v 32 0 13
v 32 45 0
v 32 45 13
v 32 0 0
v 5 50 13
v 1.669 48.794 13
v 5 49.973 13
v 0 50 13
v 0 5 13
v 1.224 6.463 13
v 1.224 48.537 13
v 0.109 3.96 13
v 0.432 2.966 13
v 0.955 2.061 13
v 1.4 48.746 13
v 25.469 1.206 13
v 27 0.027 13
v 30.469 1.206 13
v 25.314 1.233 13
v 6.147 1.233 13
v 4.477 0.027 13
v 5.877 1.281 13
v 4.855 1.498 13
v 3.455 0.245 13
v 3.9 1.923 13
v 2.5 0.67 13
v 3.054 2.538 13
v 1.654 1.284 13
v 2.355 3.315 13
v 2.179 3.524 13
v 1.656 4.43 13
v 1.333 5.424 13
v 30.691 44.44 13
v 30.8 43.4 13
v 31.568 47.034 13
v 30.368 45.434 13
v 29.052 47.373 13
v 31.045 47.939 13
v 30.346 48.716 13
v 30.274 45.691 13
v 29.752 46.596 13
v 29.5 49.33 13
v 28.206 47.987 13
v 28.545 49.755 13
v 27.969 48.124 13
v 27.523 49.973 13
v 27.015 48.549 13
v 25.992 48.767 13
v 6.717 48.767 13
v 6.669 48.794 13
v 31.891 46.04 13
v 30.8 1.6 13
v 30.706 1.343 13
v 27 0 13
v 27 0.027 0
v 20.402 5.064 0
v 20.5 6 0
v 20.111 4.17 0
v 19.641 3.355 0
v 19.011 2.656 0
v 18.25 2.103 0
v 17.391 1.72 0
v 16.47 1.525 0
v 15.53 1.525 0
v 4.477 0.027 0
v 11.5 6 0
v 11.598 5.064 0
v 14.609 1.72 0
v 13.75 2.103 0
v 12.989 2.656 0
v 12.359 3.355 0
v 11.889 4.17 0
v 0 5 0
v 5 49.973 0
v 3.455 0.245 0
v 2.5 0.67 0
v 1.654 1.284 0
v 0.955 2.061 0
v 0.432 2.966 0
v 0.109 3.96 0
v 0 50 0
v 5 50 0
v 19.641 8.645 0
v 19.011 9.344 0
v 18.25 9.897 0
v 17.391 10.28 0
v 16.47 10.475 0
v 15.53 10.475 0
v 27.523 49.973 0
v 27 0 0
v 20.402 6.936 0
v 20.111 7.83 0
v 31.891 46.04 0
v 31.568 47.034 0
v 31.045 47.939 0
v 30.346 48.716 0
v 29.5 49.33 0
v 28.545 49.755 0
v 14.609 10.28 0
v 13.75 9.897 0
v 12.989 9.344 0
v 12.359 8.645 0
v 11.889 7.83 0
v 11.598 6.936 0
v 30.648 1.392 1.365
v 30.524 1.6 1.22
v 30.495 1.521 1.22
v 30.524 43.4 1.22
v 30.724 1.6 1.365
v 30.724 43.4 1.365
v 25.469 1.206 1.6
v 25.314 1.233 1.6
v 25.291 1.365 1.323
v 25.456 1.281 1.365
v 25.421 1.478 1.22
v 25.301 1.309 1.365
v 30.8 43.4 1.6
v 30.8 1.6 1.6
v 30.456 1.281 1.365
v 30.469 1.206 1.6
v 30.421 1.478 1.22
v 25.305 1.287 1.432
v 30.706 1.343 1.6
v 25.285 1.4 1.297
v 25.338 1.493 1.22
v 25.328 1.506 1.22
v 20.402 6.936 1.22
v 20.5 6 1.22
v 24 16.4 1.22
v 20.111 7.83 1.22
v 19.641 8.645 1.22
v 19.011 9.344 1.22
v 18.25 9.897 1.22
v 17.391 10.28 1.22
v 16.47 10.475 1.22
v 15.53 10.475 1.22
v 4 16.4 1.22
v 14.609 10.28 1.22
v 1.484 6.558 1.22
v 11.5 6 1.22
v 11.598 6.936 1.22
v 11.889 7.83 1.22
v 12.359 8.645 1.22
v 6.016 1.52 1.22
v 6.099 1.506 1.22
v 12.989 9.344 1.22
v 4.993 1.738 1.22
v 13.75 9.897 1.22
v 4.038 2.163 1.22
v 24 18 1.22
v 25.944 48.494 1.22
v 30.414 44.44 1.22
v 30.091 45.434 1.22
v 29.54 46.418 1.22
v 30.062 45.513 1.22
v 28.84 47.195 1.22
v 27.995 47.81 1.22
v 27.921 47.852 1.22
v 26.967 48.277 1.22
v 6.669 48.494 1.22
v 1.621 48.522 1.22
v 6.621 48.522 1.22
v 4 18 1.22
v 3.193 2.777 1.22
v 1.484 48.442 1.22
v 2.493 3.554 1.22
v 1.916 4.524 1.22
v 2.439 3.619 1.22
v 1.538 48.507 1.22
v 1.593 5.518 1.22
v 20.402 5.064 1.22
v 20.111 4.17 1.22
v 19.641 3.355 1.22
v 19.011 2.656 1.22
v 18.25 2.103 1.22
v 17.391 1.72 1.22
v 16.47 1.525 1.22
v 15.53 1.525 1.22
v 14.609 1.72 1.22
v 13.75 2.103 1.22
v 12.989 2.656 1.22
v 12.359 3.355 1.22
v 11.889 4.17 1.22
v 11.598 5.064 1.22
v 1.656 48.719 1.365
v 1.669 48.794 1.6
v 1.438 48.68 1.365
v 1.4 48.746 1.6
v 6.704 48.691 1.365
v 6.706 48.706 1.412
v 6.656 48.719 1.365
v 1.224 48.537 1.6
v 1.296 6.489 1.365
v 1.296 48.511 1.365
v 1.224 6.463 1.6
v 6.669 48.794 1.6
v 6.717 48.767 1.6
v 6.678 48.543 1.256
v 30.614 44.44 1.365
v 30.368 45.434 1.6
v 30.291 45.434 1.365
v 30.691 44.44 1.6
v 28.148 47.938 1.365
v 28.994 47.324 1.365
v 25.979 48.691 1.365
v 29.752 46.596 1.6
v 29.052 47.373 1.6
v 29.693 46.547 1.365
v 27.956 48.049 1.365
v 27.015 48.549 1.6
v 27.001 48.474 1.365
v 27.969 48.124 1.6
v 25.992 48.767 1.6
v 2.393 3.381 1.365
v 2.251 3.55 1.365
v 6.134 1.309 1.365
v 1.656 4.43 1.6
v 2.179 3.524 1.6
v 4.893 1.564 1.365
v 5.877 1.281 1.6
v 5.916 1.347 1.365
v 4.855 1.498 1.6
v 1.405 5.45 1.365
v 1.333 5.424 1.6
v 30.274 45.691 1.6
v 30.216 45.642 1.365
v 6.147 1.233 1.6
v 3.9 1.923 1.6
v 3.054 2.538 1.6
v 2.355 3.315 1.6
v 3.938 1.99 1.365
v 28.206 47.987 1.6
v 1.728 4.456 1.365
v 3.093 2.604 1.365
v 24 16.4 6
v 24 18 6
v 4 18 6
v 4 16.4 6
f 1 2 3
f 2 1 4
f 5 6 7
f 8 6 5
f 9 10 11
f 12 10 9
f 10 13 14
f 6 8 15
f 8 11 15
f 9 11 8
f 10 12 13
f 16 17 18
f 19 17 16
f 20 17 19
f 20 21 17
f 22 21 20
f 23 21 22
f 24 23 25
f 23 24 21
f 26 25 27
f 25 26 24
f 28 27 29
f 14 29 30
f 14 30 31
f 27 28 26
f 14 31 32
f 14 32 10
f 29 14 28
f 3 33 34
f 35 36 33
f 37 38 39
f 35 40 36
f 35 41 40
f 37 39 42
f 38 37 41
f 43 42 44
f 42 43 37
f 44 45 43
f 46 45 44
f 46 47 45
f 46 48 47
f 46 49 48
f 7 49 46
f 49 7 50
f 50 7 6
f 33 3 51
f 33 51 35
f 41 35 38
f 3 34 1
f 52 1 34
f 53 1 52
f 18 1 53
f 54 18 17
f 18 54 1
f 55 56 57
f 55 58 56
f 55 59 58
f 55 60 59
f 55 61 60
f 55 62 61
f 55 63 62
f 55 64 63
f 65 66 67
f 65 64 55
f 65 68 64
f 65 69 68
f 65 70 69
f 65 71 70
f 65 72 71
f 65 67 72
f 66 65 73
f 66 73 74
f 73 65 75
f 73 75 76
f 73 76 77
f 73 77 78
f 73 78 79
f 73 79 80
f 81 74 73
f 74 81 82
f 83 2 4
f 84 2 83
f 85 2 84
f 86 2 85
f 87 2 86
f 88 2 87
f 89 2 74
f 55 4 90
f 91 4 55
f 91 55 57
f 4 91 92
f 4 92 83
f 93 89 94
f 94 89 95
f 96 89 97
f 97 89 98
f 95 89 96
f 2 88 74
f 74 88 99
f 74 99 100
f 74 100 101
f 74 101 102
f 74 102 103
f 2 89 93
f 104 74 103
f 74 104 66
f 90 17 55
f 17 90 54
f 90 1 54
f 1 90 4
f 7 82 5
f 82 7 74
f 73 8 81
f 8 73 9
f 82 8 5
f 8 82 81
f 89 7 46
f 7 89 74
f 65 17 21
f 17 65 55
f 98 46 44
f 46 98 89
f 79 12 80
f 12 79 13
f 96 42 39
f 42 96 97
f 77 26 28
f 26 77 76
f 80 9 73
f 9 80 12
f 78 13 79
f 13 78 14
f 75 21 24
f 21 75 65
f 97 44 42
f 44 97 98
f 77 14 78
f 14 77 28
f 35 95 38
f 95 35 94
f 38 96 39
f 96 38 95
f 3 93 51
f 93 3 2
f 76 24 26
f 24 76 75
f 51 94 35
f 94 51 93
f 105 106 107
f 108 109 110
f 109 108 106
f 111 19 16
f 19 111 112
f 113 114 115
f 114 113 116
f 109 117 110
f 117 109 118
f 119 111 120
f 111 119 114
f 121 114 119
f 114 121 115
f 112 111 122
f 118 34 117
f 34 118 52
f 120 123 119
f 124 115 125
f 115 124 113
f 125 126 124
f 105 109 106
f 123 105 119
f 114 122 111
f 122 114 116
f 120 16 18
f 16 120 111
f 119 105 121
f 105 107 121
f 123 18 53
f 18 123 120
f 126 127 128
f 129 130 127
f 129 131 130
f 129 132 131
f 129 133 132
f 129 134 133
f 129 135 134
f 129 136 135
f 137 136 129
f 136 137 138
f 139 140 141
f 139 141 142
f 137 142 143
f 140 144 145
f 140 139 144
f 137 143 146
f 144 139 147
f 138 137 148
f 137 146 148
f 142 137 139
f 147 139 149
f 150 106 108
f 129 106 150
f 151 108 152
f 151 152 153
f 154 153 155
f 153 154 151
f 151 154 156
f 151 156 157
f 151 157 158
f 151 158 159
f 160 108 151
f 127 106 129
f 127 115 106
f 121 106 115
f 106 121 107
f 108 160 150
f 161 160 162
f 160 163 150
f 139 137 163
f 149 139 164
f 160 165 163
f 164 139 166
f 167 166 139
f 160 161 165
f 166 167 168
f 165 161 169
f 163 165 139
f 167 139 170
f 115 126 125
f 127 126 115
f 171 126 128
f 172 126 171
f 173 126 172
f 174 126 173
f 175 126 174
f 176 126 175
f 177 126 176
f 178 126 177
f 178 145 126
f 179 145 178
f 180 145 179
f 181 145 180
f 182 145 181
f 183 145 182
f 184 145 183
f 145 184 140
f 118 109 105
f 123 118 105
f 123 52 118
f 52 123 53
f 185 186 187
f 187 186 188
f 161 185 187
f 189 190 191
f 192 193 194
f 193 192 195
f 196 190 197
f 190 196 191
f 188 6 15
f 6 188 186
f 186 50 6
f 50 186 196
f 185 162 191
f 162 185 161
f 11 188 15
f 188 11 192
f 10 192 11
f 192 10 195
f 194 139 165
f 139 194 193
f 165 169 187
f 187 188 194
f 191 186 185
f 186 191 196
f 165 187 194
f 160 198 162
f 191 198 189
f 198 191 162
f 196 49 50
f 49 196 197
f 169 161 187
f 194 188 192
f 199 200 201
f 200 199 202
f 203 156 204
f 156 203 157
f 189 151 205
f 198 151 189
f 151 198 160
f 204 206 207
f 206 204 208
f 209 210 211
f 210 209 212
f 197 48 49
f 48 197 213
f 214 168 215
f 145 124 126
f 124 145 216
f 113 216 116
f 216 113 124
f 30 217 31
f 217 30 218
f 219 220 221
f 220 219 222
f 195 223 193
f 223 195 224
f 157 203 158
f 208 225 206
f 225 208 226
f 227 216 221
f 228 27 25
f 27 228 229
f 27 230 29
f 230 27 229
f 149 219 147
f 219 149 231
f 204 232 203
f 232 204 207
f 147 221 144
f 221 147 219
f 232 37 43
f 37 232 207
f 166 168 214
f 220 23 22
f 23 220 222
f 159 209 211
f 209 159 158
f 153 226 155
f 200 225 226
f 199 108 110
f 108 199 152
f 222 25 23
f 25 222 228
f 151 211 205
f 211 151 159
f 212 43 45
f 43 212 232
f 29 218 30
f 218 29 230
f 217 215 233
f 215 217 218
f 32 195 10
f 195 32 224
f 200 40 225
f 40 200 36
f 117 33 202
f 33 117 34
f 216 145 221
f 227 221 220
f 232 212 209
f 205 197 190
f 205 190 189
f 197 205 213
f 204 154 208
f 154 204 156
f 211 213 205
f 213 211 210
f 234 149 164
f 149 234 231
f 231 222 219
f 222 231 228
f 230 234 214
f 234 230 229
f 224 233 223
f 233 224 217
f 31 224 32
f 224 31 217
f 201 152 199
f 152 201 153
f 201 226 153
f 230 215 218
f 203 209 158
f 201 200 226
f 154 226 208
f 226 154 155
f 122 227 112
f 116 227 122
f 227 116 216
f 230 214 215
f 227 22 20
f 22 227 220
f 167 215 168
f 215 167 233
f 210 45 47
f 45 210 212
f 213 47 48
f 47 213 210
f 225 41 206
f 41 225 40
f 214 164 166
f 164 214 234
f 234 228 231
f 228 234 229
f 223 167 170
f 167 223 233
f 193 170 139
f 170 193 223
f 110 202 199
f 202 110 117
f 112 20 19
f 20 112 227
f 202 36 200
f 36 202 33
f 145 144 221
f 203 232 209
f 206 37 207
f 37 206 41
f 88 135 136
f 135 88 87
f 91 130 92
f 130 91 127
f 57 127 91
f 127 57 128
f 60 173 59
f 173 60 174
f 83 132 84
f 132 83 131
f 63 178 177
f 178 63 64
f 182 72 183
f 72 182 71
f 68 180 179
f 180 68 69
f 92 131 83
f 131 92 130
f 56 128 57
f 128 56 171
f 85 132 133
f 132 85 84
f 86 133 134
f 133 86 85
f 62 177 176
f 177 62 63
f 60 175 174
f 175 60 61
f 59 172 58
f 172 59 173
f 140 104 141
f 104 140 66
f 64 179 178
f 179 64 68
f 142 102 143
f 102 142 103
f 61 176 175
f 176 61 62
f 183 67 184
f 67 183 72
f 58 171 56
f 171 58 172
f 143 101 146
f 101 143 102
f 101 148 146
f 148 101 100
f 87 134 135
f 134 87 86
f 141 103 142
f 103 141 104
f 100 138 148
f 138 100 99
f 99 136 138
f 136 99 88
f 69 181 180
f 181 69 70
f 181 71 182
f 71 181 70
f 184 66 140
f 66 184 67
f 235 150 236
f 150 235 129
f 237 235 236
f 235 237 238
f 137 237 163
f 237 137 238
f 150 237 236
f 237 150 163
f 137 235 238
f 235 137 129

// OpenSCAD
// Fully parametric box for 3D printing
// v4b
// http://www.thingiverse.com/thing:1918169
//
// Original box based on:
// http://tinyurl.com/oznh2p4
//
// Ventilation holes based on:
// http://www.thingiverse.com/thing:1826360

// Configure below
//
/* [Box parameters] */
// Length of box in mm
length = 50;   //[10:254]
// Width of box in mm
width = 32;    //[10:254]
// Height of box in mm
tall = 13;      //[10:254]
// Wall thickness of box in mm
thick = 1.6;      //[1:15]
// Depth of lip on lid in mm
lDepth = 2;     //[1:15]
// Corner radius; 0 = four square corners
cRadius = 5;   //[0:25]   
// Fancy: Square two opposing corners; 0=no, 1=yes (must be using cRadius)
sqCorners = 1;  //[0,1]

/* [Vent Parameters] */
// Vent hole size in mm; 0 = no vents
hSize = 0;      //[0:15]
// Hole Spacing in mm; must be > 0
hSpace = 1;     //[1:15]
// Vent hole type; 0=round, 1=square
hType = 0;      //[0,1]
//
// Configure above

/* [Hidden] */
//fn=200;            // 40 fragments per cicle; comment for draft mode
//$fn=60;
$fs=0.3;
fuz=0.1; fuzz=2*fuz;

// Draw Box
module post() {
/*     difference() {
	  cylinder(d=6, h=6);
	  cylinder(d=2, h=6.5);
     }
*/
     cylinder(d=5,h=1.2);
     cylinder(d=2.4, h=3);
}

module box() {
    translate([cRadius, cRadius, 0]){
	// Create a hollow box
	difference() {
	    // Create box shape
	    roundedBox(length,width,tall,cRadius,sqCorners);
	    // Create negative box shape, smaller by wall thickness plus clearance
	    translate([thick,thick,thick]) { 
		minkowski() { roundedBox(length-(thick*2),width-(thick*2),tall,cRadius,sqCorners);
		    sphere(r=0.4);
		}
		
		// Add vent holes to long sides
		gutterSpace=max(floor(tall*.2),thick*2,cRadius+hSize);
		if (hSize>0) addVentHoles(
		    length,     				// Panel Width
		    tall,						// Panel Height
		    gutterSpace,                // Gutter Width
		    gutterSpace,                // Gutter Height
		    hSize,						// Hole Radius
		    hSpace,					    // Hole Spacing
		    width+0.02,					// Hole Length
		    -(cRadius)-(thick+0.01),	// X Location
		    -gutterSpace,	            // Y Location
		    hType						// Hole Type
		    );
	    }
	    // cut openings in box	
	    //translate([(width-12)/2-cRadius,-cRadius-0.1,thick+2]) cube([12,10,6]);
	    translate([width/2-cRadius,6-cRadius,-fuz]) cylinder(d=10-1,h=5);
	    
	}
    }
    // Add mounting posts inside box
    //translate([(width-9)/2, 10, thick]) post();
    //translate([(width+9)/2, 10, thick]) post();
    translate([4, length-32-thick, 0]) cube([width-12,thick,6]);
}
box();

module lid() {
// Draw Box Lid
// Shift along-side first box
    translate([(width*2)+(10-cRadius), cRadius, 0]) {
	mirror([1,0,0]) {
	    difference() {
		union() {
		    // Create lid
		    roundedBox(length,width,thick,cRadius,sqCorners);
		    // Create lip on top of lid
		    difference() {
			// Create lip shape
			translate([thick,thick,thick]) {
			    roundedBox(length-(thick*2),width-(thick*2),lDepth,cRadius,sqCorners);}
                        // Create negative shape, smaller by wall thickness
                        // (add 0.01 to depth to bypass rendering bug)
                        translate([(thick*2),(thick*2),thick+0.01]) {
                            roundedBox(length-(thick*4),width-(thick*4),lDepth,cRadius,sqCorners);}    
		    }
		}

		// Cut holes in lid
		//translate([width/2-cRadius,length/2-cRadius,thick/2]) cube([15,24,4*thick],center=true);
        	    translate([width/2-cRadius-7,9-cRadius,-fuz]) cylinder(d=4,h=5);

            }
	}
    }
}

//lid();

// Render box according to parameters
module roundedBox(length, width, tall, radius, sqCorners)
{
	if (radius==0) {
		// Draw regular cube
		cube(size=[width,length,tall]);
	} else {
		// Draw rounded corner cube
		diam=2*radius;

		// Draw base rounded shape
		minkowski() {
			cube(size=[width-diam,length-diam, tall/2]);
			cylinder(r=radius, h=tall/2);
		}

        // Square opposing corners
		if (sqCorners==1) {
			// Corner cube bottom right
			translate([width-diam,-radius,0]) {cube(size=[radius,radius,tall]);}

			// Corner cube top left
			translate([-radius,length-diam,0]) {cube(size=[radius,radius,tall]);}  
		}
	}
}

// Ventillate opposing panels Y-axis panels
module addVentHoles (pWidth, pHeight, gWidth, gHeight, hSize, hSpace, hLength, xLoc, yLoc, hType) {
	hSpacing = hSpace + hSize;
    mainRowHoles = floor((pWidth - (2 * gWidth)) / hSpacing);
    rows = floor((pHeight - (2 * gHeight)) / hSpacing);

    for (n = [0:rows]) {
        for (i = [0:mainRowHoles]) {
            // If we're on an even-number row, then we put holes across the panel
            if (n % 2 == 0)
                translate([
					xLoc,
					yLoc+(i*hSpacing)+(gWidth),
					(n*hSpacing)+gHeight])
					
					rotate([0,90,0])
                    // Choose square or round hole
					if (hType==0) {
						cylinder(h=hLength, r=hSize/2);
					} else {
						translate([0,0,hLength/2]) cube(size=[hSize,hSize,hLength], center=true);
					}	

            // If we're on an odd-number row then we offset the holes, and drop one
            if ((n % 2 == 1) && (i<mainRowHoles)) // This drops the hole
				translate([
					xLoc,
					yLoc+(i*hSpacing)+(gWidth)+(hSpacing/2),
					(n*hSpacing)+gHeight]) 
					
					rotate([0,90,0])
					// Choose square or round hole
					if (hType==0) {				 
						cylinder(h=hLength, r=hSize/2);
					} else {
						translate([0,0,hLength/2]) cube(size=[hSize,hSize,hLength], center=true);
					}	
        }
    }
}
